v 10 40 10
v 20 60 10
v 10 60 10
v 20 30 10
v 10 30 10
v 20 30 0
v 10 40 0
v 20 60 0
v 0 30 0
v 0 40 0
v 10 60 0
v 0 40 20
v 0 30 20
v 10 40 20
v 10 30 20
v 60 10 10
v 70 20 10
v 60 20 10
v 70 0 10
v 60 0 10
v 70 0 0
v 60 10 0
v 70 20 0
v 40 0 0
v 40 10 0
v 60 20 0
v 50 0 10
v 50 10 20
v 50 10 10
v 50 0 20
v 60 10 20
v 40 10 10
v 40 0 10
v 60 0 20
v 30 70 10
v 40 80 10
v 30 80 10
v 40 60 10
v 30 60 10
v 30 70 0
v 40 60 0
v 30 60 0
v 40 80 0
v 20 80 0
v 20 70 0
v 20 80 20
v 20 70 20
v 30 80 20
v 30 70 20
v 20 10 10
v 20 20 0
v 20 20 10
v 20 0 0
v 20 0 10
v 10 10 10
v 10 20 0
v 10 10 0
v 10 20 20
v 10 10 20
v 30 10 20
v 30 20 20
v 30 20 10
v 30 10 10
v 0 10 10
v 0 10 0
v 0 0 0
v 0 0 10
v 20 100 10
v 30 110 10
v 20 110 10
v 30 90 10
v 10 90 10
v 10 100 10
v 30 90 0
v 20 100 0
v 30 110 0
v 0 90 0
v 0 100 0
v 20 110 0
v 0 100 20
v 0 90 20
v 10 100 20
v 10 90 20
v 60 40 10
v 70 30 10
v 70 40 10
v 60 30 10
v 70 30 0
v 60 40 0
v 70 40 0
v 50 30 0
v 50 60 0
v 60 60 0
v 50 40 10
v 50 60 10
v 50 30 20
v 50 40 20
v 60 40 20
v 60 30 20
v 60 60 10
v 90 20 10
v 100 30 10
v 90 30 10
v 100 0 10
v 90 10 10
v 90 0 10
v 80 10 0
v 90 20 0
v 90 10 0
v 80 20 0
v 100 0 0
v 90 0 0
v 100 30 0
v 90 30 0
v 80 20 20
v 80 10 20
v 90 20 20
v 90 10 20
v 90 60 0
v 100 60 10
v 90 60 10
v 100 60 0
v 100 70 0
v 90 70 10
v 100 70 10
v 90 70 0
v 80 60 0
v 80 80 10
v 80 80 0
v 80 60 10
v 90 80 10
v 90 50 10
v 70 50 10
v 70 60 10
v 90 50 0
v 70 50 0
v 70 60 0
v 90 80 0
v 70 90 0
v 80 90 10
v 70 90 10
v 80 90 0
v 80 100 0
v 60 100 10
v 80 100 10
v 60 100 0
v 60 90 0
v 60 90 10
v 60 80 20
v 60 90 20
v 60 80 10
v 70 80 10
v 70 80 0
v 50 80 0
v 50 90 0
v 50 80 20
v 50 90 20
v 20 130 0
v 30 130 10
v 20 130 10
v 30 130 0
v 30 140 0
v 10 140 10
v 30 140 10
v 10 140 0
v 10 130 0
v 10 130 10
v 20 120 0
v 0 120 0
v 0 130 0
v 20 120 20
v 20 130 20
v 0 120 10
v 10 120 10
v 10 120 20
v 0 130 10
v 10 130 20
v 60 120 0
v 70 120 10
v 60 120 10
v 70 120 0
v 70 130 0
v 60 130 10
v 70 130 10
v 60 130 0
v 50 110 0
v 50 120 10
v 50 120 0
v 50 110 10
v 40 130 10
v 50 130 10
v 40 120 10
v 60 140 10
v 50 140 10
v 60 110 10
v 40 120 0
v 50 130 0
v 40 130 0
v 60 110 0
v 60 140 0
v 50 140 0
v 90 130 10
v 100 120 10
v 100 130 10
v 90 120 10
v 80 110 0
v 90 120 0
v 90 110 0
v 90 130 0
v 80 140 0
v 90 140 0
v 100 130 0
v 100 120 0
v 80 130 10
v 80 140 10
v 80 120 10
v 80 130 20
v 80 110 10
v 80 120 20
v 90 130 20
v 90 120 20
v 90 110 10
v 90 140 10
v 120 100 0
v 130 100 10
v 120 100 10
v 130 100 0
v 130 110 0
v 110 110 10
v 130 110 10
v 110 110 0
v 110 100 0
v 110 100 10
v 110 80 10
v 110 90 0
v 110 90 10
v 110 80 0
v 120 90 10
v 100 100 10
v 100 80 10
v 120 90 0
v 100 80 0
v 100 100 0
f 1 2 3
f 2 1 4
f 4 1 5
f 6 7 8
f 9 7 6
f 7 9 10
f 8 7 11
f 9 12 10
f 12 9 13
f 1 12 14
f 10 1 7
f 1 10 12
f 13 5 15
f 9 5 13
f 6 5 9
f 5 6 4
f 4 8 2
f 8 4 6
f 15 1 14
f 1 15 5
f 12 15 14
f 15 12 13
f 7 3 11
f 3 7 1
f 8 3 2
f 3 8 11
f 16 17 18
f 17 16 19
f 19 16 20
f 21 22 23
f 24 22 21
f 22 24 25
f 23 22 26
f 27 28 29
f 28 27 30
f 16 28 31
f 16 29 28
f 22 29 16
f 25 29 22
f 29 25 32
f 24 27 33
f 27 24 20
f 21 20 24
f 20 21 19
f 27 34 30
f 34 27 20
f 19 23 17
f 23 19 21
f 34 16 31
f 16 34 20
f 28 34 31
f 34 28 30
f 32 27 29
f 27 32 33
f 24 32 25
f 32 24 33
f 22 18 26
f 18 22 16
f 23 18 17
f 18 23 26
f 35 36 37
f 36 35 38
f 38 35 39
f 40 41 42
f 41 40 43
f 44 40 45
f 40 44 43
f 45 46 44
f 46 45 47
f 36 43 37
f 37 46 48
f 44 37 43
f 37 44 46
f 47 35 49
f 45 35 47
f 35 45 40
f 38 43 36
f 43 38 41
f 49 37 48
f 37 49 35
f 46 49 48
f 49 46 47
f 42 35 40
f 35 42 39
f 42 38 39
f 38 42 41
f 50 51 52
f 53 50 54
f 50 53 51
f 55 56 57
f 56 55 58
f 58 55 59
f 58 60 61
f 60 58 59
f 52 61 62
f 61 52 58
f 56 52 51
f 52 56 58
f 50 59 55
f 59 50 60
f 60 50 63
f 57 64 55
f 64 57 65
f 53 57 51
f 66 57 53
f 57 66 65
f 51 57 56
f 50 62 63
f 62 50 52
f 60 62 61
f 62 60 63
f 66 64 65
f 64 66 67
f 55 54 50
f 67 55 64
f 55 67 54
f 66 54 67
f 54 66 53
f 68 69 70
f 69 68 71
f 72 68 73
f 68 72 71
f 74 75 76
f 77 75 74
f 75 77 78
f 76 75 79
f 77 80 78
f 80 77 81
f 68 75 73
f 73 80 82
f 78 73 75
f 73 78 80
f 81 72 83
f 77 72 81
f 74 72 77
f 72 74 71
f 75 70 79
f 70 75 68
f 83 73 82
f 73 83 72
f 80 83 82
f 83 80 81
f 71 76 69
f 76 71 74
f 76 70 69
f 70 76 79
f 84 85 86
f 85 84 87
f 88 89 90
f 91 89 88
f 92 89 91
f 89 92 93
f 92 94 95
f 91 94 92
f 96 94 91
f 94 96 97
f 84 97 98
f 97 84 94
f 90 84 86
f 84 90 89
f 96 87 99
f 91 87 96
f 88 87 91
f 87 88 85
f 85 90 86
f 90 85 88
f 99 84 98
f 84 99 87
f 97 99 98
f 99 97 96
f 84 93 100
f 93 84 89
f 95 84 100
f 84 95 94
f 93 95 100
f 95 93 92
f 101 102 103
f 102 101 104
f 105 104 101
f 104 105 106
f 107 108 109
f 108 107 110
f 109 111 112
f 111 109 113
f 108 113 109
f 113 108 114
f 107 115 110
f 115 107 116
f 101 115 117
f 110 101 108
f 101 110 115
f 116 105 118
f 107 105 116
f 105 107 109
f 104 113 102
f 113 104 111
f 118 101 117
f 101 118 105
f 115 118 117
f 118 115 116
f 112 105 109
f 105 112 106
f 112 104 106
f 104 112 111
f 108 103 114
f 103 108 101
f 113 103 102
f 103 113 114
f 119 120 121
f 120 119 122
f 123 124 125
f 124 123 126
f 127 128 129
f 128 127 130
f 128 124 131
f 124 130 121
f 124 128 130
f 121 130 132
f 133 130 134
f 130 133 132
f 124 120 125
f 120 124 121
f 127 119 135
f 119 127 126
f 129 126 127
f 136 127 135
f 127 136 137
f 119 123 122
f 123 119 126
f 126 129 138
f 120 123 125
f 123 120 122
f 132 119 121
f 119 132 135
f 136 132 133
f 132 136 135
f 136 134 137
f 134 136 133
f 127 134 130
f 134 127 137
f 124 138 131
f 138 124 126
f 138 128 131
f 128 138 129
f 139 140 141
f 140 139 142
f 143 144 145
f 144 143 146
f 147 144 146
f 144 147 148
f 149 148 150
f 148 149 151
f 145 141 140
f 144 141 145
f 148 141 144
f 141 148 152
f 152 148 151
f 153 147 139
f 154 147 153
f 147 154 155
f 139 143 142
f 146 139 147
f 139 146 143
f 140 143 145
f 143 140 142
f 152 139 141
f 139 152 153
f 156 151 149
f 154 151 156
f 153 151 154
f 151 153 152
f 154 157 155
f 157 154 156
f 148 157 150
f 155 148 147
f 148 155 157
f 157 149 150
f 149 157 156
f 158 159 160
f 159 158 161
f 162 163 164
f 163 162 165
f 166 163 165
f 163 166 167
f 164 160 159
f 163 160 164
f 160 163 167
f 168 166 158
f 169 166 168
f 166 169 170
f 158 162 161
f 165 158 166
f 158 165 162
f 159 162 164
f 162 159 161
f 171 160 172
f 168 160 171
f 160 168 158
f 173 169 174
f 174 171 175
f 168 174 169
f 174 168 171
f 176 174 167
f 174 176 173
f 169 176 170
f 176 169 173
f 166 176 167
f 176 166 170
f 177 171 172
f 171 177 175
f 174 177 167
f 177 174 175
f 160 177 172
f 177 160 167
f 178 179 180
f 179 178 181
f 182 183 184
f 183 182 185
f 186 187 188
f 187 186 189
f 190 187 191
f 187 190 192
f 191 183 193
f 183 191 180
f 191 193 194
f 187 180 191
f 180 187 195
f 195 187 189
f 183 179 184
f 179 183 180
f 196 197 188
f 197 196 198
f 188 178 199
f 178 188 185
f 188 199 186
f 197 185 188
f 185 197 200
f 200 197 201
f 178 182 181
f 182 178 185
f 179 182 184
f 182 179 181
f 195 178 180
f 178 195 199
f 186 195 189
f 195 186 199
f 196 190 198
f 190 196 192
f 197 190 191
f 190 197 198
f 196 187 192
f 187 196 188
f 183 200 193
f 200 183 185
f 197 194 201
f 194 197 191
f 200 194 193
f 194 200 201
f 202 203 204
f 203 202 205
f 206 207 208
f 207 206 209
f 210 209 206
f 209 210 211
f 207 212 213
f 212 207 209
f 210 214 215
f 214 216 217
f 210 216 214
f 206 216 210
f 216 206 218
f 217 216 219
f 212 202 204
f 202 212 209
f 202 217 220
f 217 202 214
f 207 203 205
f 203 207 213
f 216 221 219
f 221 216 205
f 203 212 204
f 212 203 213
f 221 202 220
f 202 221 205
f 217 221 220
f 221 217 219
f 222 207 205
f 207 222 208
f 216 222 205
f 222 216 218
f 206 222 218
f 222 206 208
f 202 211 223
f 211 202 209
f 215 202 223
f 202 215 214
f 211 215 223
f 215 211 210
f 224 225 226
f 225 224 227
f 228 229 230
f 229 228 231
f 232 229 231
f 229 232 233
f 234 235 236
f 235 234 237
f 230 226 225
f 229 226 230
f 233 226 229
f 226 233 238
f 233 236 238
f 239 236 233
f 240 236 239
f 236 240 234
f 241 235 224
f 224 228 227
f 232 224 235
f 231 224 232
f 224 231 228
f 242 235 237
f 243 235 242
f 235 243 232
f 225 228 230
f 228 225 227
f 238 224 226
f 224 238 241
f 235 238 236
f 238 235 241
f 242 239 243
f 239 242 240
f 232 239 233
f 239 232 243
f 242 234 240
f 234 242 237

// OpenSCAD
//cubo negro//

//LL
module LL(unidad){
     cube(unidad);
     translate ([unidad,0,0]){
       cube(unidad);}
     translate ([0,0,unidad]){
       cube(unidad);}
          }       
//piezaT    
module piezaT(unidad){
  LL(unidad);
    translate([-unidad,0,0]){
     cube([unidad,unidad,unidad]);}
    translate([unidad,unidad,0]){
     cube([unidad,unidad,unidad]);} 
     }
                  
//gemeloI
module gemeloI(unidad){
   LL(unidad);
    translate([unidad,-unidad,0]){
     cube(unidad);}}     

//piezaZ     
module piezaZ(unidad){  
    LL(unidad);
    translate([unidad,-unidad,-unidad]){
     cube([unidad,unidad,2*unidad]);}}  
     
//piezaGamma
module piezaGamma(unidad){
 LL(unidad);
  translate([unidad,unidad,0]){
     cube([unidad,2*unidad,unidad]);}  
 }
 
//pieza1
module pieza1(unidad){
    LL(unidad);
    translate([2*unidad,0,0]){
    cube([unidad,2*unidad,unidad]);}} 
//pieza2
module pieza2(unidad){
    LL(unidad);
    translate([0,unidad,0]){
    cube([unidad,2*unidad,unidad]);}}
    
//pieza3
module pieza3(unidad){
    LL(unidad);
    translate([unidad,-unidad,0]){
    cube([unidad,unidad,unidad]);}
    translate([unidad,unidad,0]){
    cube([unidad,unidad,unidad]);}}

//pieza4    
module pieza4(unidad){
    rotate([90,0,0]){
        LL(unidad);}
    translate([-unidad,-2*unidad,0]){
    cube([unidad,unidad,unidad]);}
    translate([0,0,0]){
    cube([unidad,unidad,unidad]);}}

//pieza5    
module pieza5(unidad){
    rotate([90,0,0]){
        LL(unidad);}
     translate([-unidad,-2*unidad,0]){
    cube([unidad,unidad,unidad]);}
    translate([-unidad,-2*unidad,unidad]){
    cube([unidad,unidad,unidad]);}    }  
//pieza6    
module pieza6(unidad){
    rotate([90,0,0]){
        LL(unidad);}
     translate([-unidad,-2*unidad,0]){
    cube([unidad,unidad,unidad]);}
    translate([0,-2*unidad,unidad]){
    cube([unidad,unidad,unidad]);}    }    
//pieza7    
module pieza7(unidad){
    rotate([90,0,0]){
        LL(unidad);}    
    translate([-unidad,-unidad,0]){
    cube([unidad,unidad,unidad]);}
    translate([0,0,0]){
    cube([unidad,unidad,unidad]);}}
//pieza8
module pieza8(unidad){
    LL(unidad);
    translate([0,-unidad,0]){
    cube([unidad,unidad,unidad]);}
    translate([0,unidad,0]){
    cube([unidad,unidad,unidad]);}}
//pieza9    
module pieza9(unidad){
    rotate([90,0,0]){
        LL(unidad);}
    translate([-unidad,-3*unidad,0]){
        cube([unidad,2*unidad,unidad]);}    
    }    

translate([0,30,0]){       
piezaGamma(10);} 
translate([50,0,0]){ 
piezaT(10);}
translate([20,70,0]){ 
gemeloI(10);}        
translate([10,10,20]){ 
  rotate([0,90,0]){
  piezaZ(10);}}
translate([0,90,0]){       
pieza1(10);}
translate([50,30,0]){       
pieza2(10);}
translate([80,10,0]){       
pieza3(10);}
translate([80,70,0]){       
pieza4(10);}
translate([60,100,0]){       
pieza5(10);}
translate([10,140,0]){       
pieza6(10);}
translate([50,130,0]){       
pieza7(10);}
translate([80,120,0]){       
pieza8(10);}
translate([110,110,0]){       
pieza9(10);}
         
